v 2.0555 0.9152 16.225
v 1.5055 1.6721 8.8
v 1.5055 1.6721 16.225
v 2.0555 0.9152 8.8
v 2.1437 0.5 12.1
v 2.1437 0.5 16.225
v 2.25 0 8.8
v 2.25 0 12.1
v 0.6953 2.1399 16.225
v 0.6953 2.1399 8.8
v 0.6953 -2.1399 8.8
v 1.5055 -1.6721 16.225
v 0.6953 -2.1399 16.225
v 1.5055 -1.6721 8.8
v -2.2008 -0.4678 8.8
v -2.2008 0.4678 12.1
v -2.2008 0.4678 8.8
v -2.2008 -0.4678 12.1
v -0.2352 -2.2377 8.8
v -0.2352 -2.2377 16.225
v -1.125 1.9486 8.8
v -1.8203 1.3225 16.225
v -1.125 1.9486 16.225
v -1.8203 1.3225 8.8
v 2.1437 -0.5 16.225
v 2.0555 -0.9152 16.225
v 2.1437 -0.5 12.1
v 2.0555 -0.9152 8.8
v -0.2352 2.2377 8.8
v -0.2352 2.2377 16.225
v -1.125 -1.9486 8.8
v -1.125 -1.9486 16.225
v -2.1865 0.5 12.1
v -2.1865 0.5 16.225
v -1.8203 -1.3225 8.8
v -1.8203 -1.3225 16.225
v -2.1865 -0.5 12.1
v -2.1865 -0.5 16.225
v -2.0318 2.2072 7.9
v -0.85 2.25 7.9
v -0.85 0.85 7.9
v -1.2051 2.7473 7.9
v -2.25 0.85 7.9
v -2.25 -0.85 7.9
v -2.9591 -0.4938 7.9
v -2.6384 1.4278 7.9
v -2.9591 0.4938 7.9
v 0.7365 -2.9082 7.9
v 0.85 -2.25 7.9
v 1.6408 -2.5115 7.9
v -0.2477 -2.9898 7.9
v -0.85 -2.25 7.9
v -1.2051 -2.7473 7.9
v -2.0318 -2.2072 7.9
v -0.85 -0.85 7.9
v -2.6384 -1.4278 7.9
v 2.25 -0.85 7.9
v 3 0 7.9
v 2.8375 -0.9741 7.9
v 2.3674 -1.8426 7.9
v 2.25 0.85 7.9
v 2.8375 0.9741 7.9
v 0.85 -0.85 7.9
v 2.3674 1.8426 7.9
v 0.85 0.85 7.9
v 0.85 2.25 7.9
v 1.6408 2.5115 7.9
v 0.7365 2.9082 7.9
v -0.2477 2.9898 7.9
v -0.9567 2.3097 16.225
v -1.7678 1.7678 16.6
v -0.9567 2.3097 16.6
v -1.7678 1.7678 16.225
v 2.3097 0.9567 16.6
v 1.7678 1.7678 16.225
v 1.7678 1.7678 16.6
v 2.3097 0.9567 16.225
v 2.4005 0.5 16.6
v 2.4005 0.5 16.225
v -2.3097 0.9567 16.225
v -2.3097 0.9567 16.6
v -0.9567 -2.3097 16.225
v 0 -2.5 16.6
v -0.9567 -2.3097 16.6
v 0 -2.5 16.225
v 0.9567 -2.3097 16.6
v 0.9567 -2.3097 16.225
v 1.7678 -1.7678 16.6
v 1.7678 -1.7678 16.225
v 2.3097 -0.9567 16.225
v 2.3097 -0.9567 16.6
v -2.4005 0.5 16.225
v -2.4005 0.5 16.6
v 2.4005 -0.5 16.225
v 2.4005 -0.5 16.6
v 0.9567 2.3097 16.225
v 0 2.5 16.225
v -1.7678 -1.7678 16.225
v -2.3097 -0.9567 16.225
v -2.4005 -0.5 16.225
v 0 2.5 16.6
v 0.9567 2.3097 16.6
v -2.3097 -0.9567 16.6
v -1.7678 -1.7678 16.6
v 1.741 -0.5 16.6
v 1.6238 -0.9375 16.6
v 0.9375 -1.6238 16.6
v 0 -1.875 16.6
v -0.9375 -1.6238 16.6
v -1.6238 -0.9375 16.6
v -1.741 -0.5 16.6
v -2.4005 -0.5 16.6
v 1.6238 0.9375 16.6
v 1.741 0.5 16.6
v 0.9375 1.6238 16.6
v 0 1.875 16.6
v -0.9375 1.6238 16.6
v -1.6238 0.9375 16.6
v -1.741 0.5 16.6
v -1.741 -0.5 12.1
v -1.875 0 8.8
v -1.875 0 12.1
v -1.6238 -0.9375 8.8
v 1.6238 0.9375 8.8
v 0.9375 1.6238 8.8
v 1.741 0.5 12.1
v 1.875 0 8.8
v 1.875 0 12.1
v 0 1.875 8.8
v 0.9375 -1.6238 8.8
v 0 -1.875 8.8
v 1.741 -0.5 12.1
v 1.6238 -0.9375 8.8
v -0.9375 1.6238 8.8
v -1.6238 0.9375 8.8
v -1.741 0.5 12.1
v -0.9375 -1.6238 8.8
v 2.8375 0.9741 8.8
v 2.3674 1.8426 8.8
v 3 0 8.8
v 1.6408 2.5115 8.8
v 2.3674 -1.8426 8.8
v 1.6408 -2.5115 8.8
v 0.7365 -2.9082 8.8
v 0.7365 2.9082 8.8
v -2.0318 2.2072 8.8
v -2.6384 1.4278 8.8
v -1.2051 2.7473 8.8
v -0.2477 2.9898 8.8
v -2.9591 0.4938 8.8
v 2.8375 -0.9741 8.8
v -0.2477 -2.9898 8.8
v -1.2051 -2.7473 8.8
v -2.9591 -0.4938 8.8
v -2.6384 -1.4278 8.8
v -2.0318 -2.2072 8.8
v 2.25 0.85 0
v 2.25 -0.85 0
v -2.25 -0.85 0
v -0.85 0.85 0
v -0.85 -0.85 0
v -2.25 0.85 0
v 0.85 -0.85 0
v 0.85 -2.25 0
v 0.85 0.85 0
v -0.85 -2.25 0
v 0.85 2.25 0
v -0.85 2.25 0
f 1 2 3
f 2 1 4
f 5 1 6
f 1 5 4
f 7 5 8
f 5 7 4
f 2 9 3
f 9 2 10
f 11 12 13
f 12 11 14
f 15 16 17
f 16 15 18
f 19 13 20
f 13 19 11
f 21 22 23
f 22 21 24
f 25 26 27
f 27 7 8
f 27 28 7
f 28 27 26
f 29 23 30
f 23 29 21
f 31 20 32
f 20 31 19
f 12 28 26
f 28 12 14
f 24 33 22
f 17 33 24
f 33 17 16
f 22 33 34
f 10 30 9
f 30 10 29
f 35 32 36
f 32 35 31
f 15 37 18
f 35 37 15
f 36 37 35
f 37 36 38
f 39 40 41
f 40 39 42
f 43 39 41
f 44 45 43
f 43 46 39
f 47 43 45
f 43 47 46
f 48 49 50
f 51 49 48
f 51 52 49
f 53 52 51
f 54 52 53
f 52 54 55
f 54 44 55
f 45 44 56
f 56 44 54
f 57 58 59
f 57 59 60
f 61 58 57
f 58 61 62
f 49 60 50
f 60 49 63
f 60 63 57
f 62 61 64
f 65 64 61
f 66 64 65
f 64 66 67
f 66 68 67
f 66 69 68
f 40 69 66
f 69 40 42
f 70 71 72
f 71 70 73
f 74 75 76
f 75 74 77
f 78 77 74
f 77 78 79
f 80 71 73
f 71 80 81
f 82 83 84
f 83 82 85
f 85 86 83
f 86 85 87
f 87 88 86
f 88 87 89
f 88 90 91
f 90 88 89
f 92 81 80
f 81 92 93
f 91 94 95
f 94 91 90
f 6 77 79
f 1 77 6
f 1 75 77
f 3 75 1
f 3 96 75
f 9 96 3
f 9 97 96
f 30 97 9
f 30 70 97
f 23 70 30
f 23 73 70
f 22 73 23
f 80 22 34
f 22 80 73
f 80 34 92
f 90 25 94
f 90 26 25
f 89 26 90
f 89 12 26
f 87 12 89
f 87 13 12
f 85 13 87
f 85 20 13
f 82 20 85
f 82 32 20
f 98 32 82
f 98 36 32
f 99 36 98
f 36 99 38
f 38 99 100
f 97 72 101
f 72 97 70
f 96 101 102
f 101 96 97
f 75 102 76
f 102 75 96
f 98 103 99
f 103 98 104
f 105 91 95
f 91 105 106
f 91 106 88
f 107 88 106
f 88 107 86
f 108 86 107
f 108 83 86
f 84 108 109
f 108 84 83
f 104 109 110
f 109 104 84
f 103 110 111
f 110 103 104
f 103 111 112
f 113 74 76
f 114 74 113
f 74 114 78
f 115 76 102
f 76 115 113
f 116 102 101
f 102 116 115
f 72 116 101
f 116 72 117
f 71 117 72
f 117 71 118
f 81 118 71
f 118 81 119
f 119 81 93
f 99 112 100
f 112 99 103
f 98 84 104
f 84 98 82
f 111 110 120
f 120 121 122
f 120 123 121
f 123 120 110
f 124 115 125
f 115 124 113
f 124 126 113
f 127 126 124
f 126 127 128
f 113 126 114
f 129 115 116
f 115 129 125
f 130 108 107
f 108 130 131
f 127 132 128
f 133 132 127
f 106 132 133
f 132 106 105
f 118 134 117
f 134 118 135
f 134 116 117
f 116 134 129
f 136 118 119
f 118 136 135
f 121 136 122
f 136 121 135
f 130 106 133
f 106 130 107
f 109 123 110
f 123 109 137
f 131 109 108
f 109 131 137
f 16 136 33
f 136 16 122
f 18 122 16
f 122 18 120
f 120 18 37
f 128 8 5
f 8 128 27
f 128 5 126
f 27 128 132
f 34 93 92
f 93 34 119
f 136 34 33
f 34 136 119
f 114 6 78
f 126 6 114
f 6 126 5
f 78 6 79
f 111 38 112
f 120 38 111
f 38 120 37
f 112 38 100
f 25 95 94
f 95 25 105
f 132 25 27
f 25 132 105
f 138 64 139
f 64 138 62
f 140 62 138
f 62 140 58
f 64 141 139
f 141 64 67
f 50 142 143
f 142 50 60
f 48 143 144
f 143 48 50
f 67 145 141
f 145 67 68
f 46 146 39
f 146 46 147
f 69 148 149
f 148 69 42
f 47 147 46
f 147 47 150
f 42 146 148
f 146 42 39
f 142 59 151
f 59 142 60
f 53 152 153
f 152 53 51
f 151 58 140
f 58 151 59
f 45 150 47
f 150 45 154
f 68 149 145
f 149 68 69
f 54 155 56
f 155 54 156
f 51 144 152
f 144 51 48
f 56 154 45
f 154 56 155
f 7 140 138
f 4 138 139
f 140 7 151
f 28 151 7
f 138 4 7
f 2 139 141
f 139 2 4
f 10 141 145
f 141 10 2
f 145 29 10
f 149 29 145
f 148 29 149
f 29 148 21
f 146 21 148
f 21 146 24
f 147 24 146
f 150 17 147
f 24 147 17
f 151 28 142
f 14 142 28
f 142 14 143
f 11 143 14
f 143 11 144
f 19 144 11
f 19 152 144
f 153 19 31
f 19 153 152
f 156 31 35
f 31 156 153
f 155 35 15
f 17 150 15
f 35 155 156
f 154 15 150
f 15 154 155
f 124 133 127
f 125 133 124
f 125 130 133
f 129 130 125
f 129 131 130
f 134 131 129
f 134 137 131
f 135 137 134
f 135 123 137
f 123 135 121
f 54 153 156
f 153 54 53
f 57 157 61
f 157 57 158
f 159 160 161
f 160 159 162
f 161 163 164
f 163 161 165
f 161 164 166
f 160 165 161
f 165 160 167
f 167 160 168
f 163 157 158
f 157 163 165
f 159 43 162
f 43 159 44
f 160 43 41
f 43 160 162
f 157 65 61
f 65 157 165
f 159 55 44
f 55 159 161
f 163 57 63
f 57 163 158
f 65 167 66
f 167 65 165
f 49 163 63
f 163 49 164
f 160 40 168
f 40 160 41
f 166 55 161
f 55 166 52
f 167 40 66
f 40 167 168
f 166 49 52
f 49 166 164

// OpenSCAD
union() {
difference() {
union() {
translate([0,0,7.9])
cylinder (h = 8.5, r = 2.25, $fs = 1);
translate([0,0,16.225]) 
cylinder (h = .375, r = 2.5, $fs = 1);
}
translate([0,0,-.05])
cylinder (h = 16.7, r = 1.875, $fs = 1);
cube([10,1,9], center = true);
translate([0,0,16.6])
cube([10,1,9], center = true);
}
translate([0,0,7.9])
cylinder(h = .9, r = 3.00, $fs = 1);
translate([0,0,3.95])
cube([4.5,1.7,7.9], center = true);
translate([0,0,3.95])
cube([1.7,4.5,7.9], center = true);
}
